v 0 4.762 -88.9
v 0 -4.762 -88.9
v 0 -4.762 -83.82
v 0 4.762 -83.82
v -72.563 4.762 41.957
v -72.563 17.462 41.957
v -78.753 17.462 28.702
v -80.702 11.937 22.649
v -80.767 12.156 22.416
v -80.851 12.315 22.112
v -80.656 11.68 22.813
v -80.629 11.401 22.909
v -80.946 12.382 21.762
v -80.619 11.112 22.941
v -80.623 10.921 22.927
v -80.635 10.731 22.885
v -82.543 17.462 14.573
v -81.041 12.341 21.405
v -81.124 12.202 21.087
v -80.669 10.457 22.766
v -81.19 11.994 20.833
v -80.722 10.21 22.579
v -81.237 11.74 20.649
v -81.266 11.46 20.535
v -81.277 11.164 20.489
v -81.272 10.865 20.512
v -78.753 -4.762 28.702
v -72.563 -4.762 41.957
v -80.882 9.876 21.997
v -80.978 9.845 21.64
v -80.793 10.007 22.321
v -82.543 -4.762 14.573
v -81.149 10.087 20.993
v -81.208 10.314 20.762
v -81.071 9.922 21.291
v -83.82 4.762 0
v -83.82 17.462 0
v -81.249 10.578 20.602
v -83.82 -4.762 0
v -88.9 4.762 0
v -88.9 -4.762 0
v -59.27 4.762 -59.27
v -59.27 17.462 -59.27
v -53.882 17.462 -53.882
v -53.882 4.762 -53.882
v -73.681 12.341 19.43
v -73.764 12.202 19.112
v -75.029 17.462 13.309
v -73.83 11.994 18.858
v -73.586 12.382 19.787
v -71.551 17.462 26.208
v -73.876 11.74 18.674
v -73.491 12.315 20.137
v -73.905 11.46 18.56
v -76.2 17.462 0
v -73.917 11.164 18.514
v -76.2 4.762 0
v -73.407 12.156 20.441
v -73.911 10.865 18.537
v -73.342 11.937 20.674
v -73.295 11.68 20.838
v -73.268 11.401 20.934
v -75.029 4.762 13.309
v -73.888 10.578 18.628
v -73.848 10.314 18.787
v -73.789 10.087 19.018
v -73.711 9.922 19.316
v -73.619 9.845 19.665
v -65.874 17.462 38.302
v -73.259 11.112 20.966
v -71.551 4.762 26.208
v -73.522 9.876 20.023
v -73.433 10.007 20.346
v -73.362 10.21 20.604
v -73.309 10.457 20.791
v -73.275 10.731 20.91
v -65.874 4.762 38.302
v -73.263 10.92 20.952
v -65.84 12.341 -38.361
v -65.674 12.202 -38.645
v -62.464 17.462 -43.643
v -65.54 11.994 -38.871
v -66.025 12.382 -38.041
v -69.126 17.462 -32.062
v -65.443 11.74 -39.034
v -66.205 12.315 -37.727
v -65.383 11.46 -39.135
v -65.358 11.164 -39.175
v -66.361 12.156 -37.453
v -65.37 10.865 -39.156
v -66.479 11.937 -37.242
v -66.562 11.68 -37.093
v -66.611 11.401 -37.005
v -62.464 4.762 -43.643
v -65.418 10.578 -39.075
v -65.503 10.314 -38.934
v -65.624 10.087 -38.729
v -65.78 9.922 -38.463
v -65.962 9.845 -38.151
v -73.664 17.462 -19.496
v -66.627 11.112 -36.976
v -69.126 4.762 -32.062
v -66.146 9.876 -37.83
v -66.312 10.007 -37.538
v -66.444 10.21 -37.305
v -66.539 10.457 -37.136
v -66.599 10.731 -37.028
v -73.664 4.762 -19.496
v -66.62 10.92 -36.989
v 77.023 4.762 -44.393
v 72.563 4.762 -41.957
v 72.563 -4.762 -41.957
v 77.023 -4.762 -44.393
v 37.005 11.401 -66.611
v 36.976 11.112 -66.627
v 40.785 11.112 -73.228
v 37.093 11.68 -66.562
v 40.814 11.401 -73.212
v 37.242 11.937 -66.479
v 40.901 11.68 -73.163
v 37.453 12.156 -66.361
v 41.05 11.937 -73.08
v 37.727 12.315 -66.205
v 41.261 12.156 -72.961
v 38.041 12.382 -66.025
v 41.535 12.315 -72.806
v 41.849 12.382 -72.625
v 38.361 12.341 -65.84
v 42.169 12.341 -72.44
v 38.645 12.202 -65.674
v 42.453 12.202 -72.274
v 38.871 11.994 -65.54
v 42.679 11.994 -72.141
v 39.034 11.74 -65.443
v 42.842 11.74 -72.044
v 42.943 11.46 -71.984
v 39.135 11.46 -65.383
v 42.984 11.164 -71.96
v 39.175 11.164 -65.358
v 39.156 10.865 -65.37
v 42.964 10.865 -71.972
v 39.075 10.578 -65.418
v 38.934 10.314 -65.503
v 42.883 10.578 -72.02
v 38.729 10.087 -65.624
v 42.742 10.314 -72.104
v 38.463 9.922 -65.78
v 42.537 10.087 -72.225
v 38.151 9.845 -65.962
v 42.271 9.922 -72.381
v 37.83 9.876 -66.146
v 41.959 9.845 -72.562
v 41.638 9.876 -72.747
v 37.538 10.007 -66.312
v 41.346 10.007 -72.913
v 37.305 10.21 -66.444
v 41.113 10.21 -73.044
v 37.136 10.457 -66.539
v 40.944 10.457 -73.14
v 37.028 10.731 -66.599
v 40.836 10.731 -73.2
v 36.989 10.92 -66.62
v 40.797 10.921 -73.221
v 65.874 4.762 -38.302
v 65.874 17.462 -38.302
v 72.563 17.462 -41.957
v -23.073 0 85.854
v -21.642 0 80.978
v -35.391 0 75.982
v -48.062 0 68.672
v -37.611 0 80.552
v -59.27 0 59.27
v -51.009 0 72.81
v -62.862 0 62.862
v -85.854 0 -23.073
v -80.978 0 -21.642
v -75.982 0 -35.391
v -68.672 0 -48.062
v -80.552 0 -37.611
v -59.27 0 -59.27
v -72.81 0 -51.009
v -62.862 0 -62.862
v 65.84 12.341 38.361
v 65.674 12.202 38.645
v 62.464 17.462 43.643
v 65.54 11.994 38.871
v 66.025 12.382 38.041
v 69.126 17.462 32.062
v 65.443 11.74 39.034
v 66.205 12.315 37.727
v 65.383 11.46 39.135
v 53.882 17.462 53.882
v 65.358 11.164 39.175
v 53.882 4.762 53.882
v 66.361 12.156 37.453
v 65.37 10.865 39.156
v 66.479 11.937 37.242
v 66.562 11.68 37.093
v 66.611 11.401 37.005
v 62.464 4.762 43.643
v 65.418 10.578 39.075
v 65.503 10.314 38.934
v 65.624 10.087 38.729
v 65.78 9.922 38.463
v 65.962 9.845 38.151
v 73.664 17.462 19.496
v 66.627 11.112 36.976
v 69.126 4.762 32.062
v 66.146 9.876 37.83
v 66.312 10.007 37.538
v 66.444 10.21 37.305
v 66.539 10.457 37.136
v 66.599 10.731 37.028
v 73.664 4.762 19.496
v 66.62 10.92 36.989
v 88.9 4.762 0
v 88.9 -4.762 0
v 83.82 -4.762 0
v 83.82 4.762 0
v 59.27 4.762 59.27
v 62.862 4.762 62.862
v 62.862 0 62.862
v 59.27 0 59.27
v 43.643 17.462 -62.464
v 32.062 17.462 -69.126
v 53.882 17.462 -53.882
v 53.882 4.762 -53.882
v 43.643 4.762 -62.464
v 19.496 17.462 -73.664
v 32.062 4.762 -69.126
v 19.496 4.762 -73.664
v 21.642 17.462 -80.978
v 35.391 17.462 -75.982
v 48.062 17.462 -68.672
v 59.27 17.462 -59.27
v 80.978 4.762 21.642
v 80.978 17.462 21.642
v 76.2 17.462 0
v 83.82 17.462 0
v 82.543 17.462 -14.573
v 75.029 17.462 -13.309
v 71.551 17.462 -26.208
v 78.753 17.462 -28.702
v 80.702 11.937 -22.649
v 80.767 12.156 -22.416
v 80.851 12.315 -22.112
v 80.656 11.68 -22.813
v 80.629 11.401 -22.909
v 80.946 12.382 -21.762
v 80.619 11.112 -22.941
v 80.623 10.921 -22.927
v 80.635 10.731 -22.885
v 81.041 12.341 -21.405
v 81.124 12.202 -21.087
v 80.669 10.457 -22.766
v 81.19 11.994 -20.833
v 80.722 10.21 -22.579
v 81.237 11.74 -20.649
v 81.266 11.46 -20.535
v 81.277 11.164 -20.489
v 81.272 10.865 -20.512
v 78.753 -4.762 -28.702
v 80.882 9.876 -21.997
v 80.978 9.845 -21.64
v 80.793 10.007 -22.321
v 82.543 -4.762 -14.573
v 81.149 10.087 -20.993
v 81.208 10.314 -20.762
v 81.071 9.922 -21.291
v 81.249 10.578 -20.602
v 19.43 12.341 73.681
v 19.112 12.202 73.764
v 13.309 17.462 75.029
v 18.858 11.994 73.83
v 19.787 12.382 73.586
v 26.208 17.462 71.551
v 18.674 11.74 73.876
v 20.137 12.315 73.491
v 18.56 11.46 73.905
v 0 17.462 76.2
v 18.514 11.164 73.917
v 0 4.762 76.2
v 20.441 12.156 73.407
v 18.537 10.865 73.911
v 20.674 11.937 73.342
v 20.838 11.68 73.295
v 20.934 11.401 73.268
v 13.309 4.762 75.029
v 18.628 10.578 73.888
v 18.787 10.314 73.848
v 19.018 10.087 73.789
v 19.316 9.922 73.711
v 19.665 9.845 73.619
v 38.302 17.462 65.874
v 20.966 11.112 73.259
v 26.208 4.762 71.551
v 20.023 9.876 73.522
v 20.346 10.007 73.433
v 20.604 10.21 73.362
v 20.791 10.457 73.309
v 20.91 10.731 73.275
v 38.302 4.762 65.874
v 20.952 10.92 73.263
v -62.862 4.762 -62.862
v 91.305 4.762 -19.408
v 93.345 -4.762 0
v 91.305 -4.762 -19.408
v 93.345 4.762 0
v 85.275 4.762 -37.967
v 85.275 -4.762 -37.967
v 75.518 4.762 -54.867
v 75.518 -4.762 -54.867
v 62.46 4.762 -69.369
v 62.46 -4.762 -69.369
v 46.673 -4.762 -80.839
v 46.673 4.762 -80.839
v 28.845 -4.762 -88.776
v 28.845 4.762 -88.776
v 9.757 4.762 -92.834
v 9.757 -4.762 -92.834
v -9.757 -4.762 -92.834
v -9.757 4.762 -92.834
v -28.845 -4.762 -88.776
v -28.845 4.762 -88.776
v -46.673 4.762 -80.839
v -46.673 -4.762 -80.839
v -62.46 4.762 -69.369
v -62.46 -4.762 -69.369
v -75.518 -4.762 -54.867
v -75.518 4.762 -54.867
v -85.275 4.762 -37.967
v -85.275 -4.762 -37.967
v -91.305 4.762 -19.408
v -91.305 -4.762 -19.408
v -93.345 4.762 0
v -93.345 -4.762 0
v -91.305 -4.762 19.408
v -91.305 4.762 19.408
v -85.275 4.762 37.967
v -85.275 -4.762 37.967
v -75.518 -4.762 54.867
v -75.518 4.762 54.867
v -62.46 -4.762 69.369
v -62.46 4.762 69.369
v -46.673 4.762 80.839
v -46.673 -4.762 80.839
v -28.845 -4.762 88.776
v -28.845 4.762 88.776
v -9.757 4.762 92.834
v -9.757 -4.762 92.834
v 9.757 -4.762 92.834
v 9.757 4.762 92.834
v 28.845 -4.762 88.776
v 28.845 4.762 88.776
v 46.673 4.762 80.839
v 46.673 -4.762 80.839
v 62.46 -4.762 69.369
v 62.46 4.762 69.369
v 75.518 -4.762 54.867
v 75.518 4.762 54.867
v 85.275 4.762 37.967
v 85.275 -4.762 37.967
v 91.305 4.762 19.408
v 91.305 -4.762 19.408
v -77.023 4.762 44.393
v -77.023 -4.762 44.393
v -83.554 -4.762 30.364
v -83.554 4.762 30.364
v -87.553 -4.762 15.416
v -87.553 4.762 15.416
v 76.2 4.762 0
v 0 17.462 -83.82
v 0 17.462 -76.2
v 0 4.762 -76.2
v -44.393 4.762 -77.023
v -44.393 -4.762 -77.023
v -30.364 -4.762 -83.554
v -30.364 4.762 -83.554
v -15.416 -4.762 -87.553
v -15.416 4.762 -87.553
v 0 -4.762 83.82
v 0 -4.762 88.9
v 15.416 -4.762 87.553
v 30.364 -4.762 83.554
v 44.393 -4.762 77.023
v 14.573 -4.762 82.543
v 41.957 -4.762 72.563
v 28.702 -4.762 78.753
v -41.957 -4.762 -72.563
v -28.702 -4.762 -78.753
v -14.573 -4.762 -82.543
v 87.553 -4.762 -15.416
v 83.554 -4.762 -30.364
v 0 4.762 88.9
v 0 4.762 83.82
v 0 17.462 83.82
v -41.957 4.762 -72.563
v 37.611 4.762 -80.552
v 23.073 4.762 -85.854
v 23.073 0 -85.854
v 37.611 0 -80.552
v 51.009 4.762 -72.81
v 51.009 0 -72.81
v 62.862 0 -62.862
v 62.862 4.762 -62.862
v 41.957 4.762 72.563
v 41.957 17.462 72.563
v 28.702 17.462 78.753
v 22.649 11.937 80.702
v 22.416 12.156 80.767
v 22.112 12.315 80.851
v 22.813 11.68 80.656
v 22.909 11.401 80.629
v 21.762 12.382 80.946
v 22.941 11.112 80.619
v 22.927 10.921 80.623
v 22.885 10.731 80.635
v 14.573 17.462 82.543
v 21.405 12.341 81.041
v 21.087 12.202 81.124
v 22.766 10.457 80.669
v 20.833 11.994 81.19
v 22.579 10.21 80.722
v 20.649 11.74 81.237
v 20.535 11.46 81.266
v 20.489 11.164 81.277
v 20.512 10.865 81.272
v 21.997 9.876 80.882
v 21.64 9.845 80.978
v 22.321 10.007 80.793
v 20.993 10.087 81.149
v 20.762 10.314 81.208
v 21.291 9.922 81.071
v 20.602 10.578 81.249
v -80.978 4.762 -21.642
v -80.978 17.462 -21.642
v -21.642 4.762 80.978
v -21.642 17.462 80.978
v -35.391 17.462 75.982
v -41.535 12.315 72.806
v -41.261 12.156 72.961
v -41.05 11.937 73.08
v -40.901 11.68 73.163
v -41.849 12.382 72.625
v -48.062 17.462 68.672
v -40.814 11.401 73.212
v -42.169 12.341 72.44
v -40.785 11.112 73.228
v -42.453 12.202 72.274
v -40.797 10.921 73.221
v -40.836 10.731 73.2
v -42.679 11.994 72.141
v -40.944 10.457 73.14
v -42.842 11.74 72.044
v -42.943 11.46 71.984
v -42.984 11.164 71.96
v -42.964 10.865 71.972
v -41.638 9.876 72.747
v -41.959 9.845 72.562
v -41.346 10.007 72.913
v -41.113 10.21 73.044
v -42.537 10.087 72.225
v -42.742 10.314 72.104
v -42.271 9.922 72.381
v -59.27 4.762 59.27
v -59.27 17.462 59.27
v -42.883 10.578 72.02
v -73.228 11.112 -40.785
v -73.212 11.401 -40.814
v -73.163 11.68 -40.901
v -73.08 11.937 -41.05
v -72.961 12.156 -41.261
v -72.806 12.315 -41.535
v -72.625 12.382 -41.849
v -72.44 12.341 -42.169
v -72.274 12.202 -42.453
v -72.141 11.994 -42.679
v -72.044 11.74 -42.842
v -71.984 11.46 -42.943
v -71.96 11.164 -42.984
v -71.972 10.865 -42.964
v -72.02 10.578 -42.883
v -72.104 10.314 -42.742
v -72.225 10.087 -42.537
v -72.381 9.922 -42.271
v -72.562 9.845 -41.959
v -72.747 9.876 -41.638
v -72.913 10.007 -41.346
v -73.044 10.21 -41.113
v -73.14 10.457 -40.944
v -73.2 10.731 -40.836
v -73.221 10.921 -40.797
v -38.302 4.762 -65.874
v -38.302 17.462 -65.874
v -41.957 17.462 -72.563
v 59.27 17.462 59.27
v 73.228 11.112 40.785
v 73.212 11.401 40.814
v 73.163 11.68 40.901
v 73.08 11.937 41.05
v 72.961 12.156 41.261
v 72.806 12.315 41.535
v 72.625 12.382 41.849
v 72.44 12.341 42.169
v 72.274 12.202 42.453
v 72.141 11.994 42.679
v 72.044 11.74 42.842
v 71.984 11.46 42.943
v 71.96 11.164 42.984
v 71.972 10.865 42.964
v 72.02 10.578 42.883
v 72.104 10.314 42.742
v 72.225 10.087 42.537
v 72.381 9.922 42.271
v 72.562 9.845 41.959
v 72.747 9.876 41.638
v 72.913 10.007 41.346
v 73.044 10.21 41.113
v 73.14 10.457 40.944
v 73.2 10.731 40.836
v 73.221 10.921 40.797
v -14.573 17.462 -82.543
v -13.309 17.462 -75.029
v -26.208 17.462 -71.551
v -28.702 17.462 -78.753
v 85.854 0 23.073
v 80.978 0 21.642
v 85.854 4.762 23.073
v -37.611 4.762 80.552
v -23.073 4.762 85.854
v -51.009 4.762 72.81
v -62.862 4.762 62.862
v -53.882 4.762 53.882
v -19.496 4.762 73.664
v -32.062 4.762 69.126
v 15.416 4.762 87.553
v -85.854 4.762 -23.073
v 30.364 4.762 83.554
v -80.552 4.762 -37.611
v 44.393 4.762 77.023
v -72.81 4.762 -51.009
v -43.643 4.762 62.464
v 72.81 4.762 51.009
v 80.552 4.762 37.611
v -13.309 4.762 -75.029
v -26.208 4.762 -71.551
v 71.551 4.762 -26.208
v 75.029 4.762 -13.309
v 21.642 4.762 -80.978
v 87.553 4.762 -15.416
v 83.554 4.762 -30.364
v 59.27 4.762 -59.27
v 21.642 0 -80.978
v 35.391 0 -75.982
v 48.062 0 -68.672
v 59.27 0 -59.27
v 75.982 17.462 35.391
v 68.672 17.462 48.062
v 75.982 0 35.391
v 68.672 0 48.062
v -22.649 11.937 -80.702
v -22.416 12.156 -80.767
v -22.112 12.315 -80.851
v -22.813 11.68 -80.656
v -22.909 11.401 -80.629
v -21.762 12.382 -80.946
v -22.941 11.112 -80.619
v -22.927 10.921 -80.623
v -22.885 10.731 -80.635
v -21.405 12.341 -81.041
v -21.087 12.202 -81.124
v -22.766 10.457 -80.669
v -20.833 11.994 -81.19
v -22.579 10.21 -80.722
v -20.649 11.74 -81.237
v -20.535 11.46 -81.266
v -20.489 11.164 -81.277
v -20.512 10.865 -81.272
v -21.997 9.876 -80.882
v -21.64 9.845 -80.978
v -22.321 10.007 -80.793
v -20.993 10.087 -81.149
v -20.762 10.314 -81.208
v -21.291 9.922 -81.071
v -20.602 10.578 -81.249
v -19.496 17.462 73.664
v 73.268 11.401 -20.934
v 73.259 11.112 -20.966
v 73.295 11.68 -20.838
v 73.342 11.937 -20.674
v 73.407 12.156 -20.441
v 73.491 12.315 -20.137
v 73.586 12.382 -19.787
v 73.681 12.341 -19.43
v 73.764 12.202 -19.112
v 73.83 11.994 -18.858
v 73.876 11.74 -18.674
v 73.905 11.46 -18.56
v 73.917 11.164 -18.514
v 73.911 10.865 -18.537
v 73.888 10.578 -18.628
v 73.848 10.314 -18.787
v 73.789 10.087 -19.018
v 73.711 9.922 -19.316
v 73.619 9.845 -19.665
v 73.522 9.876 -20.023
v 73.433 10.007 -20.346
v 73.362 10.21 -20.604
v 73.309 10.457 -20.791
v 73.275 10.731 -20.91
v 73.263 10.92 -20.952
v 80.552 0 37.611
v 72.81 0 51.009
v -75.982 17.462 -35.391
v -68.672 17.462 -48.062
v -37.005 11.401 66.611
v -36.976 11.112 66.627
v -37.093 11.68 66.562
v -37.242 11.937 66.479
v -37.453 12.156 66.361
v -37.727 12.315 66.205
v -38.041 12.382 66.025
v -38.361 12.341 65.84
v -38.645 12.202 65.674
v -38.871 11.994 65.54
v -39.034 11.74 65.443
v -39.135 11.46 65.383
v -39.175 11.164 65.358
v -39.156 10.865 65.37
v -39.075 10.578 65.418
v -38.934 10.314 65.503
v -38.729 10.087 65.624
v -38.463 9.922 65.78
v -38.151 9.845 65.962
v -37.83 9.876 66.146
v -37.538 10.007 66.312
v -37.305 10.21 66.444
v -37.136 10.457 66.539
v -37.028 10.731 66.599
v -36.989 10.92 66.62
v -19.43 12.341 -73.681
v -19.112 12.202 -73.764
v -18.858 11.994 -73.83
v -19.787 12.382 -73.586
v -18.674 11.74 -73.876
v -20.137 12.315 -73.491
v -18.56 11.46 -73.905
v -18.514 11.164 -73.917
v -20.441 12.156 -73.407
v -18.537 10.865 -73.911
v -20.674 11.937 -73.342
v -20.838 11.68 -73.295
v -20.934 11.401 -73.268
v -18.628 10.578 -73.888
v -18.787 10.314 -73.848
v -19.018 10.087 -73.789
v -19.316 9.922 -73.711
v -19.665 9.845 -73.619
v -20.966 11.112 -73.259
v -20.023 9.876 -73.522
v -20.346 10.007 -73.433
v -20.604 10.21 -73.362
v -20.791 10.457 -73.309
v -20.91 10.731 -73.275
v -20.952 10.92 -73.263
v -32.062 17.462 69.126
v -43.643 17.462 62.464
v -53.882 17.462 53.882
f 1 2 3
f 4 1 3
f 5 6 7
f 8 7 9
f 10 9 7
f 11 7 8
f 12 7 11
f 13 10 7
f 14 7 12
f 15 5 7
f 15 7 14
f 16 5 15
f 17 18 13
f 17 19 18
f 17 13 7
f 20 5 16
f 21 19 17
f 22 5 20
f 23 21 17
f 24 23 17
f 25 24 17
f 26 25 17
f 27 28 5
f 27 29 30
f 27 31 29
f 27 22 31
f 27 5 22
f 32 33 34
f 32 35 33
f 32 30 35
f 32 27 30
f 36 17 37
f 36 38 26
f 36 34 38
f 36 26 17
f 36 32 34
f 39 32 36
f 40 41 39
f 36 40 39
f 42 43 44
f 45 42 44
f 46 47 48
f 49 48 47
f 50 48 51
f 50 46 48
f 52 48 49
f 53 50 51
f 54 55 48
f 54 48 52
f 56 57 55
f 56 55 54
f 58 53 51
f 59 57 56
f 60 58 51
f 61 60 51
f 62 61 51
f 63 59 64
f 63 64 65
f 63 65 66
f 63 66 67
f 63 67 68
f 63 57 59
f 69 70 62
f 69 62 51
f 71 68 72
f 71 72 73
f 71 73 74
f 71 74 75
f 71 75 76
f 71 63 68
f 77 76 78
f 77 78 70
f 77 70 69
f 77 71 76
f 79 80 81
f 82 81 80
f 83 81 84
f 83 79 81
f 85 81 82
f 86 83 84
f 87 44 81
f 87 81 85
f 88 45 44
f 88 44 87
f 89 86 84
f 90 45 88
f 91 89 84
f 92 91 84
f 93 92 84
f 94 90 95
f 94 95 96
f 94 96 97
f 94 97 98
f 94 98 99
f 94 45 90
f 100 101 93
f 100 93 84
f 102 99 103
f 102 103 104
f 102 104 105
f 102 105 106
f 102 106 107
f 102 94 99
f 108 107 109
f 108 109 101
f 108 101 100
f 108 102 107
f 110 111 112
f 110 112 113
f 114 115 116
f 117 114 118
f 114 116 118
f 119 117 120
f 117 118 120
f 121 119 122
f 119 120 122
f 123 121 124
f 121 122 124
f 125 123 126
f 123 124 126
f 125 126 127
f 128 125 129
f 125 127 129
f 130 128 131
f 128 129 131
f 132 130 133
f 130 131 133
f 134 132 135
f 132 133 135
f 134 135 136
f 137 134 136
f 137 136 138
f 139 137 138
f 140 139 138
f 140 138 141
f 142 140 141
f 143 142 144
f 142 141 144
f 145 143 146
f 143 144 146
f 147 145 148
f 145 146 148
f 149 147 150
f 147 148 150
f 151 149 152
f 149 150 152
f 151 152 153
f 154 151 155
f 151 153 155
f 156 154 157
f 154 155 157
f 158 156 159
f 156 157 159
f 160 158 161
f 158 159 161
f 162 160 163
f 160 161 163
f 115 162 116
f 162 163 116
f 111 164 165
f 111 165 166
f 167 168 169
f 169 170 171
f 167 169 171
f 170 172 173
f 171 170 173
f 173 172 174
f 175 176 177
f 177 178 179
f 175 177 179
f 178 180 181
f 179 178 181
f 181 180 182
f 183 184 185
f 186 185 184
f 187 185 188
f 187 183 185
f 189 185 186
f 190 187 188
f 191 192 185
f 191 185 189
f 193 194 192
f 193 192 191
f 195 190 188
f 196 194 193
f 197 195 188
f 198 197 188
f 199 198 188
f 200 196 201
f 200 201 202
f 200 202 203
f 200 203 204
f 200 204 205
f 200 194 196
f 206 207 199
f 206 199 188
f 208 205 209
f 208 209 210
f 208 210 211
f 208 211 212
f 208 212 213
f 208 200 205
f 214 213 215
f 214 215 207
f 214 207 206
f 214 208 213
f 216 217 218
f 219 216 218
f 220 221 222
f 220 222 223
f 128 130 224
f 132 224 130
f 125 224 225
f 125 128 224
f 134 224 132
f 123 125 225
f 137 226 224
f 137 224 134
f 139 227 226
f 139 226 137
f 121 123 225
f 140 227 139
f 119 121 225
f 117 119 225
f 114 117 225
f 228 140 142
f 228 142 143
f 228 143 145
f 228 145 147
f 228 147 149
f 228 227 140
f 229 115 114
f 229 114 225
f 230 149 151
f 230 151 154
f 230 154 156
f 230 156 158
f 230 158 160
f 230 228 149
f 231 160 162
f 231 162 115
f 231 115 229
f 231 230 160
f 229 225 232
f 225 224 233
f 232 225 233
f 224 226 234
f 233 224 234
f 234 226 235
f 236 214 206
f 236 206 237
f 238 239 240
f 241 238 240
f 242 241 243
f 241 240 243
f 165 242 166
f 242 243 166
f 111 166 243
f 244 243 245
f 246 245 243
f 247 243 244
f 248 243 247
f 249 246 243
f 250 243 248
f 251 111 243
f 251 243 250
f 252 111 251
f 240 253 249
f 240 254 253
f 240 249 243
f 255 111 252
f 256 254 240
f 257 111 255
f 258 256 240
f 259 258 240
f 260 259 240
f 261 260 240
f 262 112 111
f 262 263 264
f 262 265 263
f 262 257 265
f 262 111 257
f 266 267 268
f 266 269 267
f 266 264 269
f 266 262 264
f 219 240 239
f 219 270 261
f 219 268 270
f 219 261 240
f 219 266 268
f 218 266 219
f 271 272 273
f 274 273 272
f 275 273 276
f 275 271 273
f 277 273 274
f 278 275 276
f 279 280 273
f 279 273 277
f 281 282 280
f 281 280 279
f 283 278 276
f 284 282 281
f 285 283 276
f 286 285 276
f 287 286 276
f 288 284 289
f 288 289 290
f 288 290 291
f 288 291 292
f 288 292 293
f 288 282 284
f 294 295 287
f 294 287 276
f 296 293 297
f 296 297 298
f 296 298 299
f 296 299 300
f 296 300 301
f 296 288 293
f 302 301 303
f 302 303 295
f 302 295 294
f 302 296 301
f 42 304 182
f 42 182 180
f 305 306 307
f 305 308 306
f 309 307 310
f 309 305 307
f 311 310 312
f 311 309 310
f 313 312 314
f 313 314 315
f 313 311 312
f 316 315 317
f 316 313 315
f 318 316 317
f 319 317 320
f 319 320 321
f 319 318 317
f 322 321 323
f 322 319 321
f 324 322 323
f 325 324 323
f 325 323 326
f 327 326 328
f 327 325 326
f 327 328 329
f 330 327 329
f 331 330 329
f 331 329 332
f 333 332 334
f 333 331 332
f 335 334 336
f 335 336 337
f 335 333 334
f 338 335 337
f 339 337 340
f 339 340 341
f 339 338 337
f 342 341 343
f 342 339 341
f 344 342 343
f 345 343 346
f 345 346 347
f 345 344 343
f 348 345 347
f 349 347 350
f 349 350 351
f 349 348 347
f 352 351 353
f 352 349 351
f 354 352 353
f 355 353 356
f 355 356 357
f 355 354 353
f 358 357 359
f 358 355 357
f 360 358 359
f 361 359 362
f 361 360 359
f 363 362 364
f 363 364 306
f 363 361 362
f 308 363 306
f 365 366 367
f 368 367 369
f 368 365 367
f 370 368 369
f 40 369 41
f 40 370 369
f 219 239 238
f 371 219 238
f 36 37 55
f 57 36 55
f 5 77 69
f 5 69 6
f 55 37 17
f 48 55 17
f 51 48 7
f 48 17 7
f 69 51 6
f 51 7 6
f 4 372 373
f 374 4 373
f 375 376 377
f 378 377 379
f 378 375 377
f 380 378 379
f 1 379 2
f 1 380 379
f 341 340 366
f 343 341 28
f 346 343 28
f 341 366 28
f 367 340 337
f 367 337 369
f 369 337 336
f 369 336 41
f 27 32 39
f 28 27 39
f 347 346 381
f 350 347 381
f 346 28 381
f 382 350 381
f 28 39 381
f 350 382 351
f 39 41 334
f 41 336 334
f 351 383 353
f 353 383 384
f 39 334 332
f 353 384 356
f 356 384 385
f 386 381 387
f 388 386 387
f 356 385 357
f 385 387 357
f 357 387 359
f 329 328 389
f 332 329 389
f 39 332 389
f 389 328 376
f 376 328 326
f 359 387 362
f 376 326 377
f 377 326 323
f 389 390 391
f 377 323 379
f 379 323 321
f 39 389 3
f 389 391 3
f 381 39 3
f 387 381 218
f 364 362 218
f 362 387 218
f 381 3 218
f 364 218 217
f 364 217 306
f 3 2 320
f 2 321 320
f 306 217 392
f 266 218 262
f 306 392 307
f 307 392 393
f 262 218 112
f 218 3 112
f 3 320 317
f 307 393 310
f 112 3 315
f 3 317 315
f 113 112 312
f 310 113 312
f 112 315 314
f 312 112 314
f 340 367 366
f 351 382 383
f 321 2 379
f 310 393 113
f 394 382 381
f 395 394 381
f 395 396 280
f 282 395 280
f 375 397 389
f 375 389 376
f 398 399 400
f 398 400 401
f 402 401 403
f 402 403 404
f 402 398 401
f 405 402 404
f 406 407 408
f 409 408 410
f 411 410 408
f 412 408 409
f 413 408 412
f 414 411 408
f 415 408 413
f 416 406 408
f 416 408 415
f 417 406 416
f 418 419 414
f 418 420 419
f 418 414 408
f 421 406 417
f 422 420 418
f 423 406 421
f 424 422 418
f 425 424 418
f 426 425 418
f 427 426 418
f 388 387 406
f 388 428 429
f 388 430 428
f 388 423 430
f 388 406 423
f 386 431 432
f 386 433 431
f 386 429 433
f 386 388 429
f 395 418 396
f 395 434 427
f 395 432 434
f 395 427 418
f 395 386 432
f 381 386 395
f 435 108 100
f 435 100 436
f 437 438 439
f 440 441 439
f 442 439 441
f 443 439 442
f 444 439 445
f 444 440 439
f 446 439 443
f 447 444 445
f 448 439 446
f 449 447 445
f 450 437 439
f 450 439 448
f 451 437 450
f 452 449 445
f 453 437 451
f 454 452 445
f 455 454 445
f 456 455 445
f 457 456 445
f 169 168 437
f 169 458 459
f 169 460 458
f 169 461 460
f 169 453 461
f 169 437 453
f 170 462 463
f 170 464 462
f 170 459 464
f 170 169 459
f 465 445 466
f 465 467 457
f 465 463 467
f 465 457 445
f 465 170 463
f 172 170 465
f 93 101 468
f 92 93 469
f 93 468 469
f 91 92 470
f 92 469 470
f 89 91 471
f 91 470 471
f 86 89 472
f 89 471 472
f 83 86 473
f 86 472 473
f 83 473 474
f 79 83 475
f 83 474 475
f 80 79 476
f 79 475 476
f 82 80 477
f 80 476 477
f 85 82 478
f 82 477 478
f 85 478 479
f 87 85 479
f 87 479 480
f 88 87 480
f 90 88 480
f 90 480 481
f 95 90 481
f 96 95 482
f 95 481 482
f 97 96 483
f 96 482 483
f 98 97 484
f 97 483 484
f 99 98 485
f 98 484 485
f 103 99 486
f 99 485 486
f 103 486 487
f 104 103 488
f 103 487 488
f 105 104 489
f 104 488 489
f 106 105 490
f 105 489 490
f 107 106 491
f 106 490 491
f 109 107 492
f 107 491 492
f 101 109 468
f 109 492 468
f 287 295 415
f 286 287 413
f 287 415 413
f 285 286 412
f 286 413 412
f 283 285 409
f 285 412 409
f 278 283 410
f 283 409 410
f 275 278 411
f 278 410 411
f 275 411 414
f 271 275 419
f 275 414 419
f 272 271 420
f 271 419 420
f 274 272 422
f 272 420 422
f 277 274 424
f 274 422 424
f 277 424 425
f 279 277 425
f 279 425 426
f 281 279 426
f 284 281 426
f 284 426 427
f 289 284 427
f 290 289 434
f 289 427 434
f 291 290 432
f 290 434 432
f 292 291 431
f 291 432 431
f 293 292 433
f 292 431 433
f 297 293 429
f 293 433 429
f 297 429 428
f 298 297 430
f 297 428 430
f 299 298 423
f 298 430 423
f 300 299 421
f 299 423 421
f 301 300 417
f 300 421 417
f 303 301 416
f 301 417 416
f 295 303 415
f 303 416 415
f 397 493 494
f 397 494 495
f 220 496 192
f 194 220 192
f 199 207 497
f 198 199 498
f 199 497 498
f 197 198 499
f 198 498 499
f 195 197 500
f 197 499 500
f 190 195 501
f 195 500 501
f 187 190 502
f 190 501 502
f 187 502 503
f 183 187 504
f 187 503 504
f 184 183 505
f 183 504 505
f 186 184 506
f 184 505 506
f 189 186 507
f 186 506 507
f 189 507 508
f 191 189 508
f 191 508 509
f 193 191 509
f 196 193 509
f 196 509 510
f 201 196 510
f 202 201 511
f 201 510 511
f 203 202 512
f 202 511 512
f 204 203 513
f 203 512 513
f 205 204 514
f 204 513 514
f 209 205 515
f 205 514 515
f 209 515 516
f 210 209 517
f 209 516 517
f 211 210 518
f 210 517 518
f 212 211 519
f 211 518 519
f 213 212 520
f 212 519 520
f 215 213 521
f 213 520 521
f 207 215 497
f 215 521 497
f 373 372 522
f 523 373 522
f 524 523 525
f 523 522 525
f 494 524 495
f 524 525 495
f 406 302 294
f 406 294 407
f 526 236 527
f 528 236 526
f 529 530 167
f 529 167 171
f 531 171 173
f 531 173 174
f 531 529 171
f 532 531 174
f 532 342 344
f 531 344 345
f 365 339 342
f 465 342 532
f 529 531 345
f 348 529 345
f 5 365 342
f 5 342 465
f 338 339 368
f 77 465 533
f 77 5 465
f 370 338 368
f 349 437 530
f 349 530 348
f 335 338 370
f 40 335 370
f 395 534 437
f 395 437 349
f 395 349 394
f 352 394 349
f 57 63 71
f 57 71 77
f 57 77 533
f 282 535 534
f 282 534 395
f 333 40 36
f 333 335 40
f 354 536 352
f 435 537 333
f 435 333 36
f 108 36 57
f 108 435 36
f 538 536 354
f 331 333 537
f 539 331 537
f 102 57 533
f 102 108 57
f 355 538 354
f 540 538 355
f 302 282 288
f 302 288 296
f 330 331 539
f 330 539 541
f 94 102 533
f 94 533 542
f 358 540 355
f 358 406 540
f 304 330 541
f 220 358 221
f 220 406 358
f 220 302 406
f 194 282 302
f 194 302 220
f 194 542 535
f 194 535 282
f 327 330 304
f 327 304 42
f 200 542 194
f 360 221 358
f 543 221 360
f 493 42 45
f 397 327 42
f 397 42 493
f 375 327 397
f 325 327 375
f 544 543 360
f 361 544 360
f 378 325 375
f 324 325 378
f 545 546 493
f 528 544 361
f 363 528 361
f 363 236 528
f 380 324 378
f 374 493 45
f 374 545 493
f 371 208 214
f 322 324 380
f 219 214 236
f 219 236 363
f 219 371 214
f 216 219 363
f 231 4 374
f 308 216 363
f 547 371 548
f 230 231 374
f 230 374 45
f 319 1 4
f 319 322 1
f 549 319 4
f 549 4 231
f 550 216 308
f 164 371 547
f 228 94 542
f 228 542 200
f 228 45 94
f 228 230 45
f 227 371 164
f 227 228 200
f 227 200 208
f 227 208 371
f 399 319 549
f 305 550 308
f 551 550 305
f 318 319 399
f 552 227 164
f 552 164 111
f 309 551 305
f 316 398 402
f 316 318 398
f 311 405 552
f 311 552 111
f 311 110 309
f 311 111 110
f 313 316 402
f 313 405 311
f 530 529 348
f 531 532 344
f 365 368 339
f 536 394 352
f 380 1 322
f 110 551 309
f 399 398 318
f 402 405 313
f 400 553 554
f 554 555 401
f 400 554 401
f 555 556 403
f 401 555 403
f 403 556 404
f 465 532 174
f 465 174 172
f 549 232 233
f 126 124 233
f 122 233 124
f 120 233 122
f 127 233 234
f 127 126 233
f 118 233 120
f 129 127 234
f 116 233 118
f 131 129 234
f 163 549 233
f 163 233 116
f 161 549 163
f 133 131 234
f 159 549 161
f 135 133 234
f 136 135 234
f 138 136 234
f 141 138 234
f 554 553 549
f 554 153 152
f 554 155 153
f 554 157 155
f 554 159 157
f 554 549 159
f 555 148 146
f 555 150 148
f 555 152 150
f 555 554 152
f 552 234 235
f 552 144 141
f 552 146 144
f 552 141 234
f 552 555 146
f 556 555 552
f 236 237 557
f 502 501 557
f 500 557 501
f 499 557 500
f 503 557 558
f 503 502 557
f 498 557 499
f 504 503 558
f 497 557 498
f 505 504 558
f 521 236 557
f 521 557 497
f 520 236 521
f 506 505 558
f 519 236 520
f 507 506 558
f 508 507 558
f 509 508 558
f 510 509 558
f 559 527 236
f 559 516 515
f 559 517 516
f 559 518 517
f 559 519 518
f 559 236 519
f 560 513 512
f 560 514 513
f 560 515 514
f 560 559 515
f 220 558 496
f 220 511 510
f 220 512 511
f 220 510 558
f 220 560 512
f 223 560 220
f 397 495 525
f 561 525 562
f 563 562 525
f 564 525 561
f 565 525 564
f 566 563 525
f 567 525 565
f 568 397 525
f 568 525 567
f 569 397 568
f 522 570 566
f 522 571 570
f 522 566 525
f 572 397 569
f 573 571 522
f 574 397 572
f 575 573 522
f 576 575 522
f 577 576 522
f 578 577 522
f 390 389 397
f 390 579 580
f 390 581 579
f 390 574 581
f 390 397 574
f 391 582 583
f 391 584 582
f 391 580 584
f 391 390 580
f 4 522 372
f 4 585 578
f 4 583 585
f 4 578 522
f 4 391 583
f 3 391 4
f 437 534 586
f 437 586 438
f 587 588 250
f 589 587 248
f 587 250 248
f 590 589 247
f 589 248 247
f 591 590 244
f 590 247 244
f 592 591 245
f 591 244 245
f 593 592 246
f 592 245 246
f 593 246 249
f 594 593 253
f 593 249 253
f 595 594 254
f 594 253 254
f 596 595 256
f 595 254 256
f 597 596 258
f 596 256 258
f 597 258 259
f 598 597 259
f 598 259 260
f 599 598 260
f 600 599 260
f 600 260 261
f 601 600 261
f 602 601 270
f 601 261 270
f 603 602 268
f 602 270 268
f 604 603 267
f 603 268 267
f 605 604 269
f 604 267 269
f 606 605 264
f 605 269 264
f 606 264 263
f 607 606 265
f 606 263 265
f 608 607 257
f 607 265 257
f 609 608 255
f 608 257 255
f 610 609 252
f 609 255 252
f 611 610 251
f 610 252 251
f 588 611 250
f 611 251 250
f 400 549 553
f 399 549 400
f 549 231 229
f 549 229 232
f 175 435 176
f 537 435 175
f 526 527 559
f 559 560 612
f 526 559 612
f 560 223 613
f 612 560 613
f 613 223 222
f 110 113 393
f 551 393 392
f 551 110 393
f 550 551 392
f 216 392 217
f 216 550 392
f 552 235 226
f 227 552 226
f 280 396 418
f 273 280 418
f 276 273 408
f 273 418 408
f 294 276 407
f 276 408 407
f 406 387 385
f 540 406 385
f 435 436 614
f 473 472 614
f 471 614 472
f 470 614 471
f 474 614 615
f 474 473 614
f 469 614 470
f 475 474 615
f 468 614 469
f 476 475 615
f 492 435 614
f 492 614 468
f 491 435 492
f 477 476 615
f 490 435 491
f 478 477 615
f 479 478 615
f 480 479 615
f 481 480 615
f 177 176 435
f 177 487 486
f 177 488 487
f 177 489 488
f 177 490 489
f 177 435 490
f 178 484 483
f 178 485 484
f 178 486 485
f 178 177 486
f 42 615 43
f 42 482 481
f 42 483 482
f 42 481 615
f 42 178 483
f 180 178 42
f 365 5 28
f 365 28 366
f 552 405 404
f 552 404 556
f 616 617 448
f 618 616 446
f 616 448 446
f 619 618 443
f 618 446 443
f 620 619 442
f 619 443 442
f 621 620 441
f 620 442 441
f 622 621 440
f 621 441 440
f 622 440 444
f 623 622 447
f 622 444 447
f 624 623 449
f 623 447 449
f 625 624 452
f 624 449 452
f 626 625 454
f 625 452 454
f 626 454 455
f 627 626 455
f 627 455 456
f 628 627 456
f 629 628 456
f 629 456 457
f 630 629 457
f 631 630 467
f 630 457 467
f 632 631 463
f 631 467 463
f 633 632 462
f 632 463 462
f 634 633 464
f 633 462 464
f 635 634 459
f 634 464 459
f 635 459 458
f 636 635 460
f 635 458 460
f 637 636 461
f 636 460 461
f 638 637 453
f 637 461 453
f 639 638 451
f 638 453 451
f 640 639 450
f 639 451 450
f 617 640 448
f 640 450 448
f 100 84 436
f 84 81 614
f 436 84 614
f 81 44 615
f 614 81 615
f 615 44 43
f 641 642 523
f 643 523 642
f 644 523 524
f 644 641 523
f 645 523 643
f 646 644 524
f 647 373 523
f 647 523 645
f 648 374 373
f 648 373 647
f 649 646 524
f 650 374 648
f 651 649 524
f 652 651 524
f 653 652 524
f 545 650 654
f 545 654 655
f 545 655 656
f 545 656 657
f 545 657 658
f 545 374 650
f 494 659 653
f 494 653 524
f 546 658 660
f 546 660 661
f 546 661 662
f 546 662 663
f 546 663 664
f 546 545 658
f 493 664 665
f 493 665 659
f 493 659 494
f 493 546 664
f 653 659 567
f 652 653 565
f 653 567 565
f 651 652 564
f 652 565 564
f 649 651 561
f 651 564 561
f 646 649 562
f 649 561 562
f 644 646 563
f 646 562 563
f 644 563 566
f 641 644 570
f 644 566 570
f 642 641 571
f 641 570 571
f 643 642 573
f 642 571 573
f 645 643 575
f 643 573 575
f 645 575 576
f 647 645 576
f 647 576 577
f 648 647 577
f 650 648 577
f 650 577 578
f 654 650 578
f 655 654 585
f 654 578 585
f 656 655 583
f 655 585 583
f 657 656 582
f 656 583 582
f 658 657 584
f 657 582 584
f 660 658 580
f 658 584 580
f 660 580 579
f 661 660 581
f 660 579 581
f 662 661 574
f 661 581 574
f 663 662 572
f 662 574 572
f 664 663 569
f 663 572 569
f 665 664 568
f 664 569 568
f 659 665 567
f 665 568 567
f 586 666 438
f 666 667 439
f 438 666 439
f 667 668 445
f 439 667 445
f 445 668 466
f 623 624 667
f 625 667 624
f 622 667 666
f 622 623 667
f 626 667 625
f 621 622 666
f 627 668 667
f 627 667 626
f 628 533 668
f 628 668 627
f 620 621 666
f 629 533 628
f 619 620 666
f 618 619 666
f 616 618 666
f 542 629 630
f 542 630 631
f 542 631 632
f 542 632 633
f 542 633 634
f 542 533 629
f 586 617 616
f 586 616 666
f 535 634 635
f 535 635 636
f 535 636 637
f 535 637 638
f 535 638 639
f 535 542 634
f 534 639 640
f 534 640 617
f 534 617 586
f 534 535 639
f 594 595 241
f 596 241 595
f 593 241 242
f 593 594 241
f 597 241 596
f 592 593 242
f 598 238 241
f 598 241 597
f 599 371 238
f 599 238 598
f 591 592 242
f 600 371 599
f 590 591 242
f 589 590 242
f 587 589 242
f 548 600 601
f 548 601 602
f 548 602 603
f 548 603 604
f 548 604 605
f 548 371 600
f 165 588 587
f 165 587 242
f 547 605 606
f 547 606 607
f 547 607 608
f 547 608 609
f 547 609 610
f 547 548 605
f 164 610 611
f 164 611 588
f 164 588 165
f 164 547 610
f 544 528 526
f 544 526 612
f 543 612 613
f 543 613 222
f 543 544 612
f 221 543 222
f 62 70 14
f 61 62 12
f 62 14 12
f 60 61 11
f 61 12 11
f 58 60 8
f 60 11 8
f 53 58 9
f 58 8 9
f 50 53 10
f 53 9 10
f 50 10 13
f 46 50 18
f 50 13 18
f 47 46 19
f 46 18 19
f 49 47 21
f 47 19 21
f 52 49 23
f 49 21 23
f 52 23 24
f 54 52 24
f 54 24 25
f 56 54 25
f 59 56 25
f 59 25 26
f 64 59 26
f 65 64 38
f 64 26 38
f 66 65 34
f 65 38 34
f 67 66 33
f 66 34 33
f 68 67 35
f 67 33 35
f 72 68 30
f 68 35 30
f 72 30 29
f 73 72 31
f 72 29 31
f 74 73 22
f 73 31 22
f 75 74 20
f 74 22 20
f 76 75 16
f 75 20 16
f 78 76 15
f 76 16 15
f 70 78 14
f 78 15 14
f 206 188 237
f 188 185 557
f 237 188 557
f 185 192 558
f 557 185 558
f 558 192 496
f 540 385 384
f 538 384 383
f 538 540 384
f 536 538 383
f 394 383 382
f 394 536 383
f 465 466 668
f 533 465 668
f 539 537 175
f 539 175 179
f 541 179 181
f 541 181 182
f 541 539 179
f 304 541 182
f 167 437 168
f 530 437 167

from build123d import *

# Parameters (mm, degrees)
BASE_DEPTH                 = 4.7625
BASE_DEPTH_BACK            = 4.7625
SKETCH1_R                  = 93.345
BOTTOM_SUPPORT_HOLES_DEPTH = 133.352951138
BOTTOM_START               = 12.7
BOTTOM_SUPPORT_GUIDE_DEPTH = 12.7
SKETCH6_R                  = 1.27
BOTTOM_BOLT_HOLE_DEPTH     = 12.7
TOP_SUPPORT_HOLES_DEPTH    = 4.7625
TOP_START                  = 12.7
TOP_SUPPORT_GUIDE_DEPTH    = 12.7
SKETCH12_R                 = 1.27
TOP_BOLT_HOLE_DEPTH        = 12.7
BOTTOM_PATTERN_COUNT       = 4
CIRPATTERN3_COUNT          = 4


with BuildPart() as part:
    # Sketch1 → Base (new, two sides: drawn at the far end of the back side and taken through both)
    with BuildSketch(Plane(origin=(0, 0, 0), x_dir=(1, 0, 0), z_dir=(0, 1, 0)).offset(-BASE_DEPTH_BACK)):
        Circle(SKETCH1_R)
    extrude(amount=BASE_DEPTH + BASE_DEPTH_BACK)

    # Sketch2 → Bottom support holes (cut, through all)
    with BuildSketch(Plane(origin=(0, 4.7625, 0), x_dir=(1, 0, 0), z_dir=(0, 1, 0))):
        with BuildLine():
            Line((0, 88.9), (0, 83.82))
            ThreePointArc((0, 83.82), (-21.72026739, 80.956916842), (-41.956713931, 72.563258996))
            Line((-41.956713931, 72.563258996), (-44.39288973, 77.022602796))
            ThreePointArc((-44.39288973, 77.022602796), (-22.977169228, 85.879332172), (0, 88.9))
        make_face()
    bottom_support_holes = extrude(amount=-BOTTOM_SUPPORT_HOLES_DEPTH, mode=Mode.SUBTRACT)

    # Sketch3 → Bottom support guide (add)
    with BuildSketch(Plane(origin=(0, 4.7625, 0), x_dir=(1, 0, 0), z_dir=(0, 1, 0)).offset(BOTTOM_START)):
        with BuildLine():
            Line((0, 83.82), (0, 76.2))
            ThreePointArc((0, 76.2), (-19.834896001, 73.573207764), (-38.302281481, 65.8739344))
            Line((-38.302281481, 65.8739344), (-41.956713931, 72.563258996))
            ThreePointArc((-41.956713931, 72.563258996), (-21.72026739, 80.956916842), (0, 83.82))
        make_face()
    bottom_support_guide = extrude(amount=-BOTTOM_SUPPORT_GUIDE_DEPTH)

    # Sketch6 → Bottom bolt hole (cut, symmetric)
    with BuildSketch(Plane(origin=(-20.978356966, 0, -78.191629498), x_dir=(-0.9658424820058785, 0, 0.2591298901183038), z_dir=(-0.2591298901183038, 0, -0.9658424820058785))):
        with Locations((-0.00326739, 11.1125)):
            Circle(SKETCH6_R)
    bottom_bolt_hole = extrude(amount=BOTTOM_BOLT_HOLE_DEPTH, both=True, mode=Mode.SUBTRACT)

    # Sketch8 → Top support holes (cut)
    with BuildSketch(Plane(origin=(-31.122978549, 4.7625, 77.296707326), x_dir=(1, 0, 0), z_dir=(0, 1, 0))):
        with BuildLine():
            Line((-31.738814298, 140.158500173), (-28.14671185, 136.566397725))
            ThreePointArc((-28.14671185, 136.566397725), (-41.480754694, 119.183343848), (-49.854870889, 98.93880289))
            Line((-49.854870889, 98.93880289), (-54.730739557, 100.369398703))
            ThreePointArc((-54.730739557, 100.369398703), (-45.850191767, 121.775253295), (-31.738814298, 140.158500173))
        make_face()
    top_support_holes = extrude(amount=-TOP_SUPPORT_HOLES_DEPTH, mode=Mode.SUBTRACT)

    # Sketch10 → Top support guide (add)
    with BuildSketch(Plane(origin=(-31.122978549, 4.7625, 77.296707326), x_dir=(1, 0, 0), z_dir=(0, 1, 0)).offset(TOP_START)):
        with BuildLine():
            Line((-28.14671185, 136.566397725), (-22.758558177, 131.178244052))
            ThreePointArc((-22.758558177, 131.178244052), (-34.92652504, 115.295431983), (-42.540730139, 96.792810073))
            Line((-42.540730139, 96.792810073), (-49.854870889, 98.93880289))
            ThreePointArc((-49.854870889, 98.93880289), (-41.480754694, 119.183343848), (-28.14671185, 136.566397725))
        make_face()
    top_support_guide = extrude(amount=-TOP_SUPPORT_GUIDE_DEPTH)

    # Sketch12 → Top bolt hole (cut, symmetric)
    with BuildSketch(Plane(origin=(-70.123769919, 0, -40.455892982), x_dir=(-0.4997212660736201, -5.817861610189737e-15, 0.8661862710951832), z_dir=(-0.8661862710951832, 1.404556040332972e-14, -0.4997212660736201))):
        with Locations((-0.00326739, 11.1125)):
            Circle(SKETCH12_R)
    top_bolt_hole = extrude(amount=TOP_BOLT_HOLE_DEPTH, both=True, mode=Mode.SUBTRACT)

    # Bottom pattern: Bottom support holes, Bottom support guide, Bottom bolt hole ×4 about axis
    bottom_pattern_axis = Axis((0, 4.7625, 0), (0, 1, 0))
    add([bottom_support_holes.rotate(bottom_pattern_axis, i * 360 / BOTTOM_PATTERN_COUNT) for i in range(1, BOTTOM_PATTERN_COUNT)], mode=Mode.SUBTRACT)
    add([bottom_support_guide.rotate(bottom_pattern_axis, i * 360 / BOTTOM_PATTERN_COUNT) for i in range(1, BOTTOM_PATTERN_COUNT)])
    add([bottom_bolt_hole.rotate(bottom_pattern_axis, i * 360 / BOTTOM_PATTERN_COUNT) for i in range(1, BOTTOM_PATTERN_COUNT)], mode=Mode.SUBTRACT)

    # CirPattern3: Top support holes, Top support guide, Top bolt hole ×4 about axis
    cirpattern3_axis = Axis((0, 4.7625, 0), (0, 1, 0))
    add([top_support_holes.rotate(cirpattern3_axis, i * 360 / CIRPATTERN3_COUNT) for i in range(1, CIRPATTERN3_COUNT)], mode=Mode.SUBTRACT)
    add([top_support_guide.rotate(cirpattern3_axis, i * 360 / CIRPATTERN3_COUNT) for i in range(1, CIRPATTERN3_COUNT)])
    add([top_bolt_hole.rotate(cirpattern3_axis, i * 360 / CIRPATTERN3_COUNT) for i in range(1, CIRPATTERN3_COUNT)], mode=Mode.SUBTRACT)


solid = part.part
